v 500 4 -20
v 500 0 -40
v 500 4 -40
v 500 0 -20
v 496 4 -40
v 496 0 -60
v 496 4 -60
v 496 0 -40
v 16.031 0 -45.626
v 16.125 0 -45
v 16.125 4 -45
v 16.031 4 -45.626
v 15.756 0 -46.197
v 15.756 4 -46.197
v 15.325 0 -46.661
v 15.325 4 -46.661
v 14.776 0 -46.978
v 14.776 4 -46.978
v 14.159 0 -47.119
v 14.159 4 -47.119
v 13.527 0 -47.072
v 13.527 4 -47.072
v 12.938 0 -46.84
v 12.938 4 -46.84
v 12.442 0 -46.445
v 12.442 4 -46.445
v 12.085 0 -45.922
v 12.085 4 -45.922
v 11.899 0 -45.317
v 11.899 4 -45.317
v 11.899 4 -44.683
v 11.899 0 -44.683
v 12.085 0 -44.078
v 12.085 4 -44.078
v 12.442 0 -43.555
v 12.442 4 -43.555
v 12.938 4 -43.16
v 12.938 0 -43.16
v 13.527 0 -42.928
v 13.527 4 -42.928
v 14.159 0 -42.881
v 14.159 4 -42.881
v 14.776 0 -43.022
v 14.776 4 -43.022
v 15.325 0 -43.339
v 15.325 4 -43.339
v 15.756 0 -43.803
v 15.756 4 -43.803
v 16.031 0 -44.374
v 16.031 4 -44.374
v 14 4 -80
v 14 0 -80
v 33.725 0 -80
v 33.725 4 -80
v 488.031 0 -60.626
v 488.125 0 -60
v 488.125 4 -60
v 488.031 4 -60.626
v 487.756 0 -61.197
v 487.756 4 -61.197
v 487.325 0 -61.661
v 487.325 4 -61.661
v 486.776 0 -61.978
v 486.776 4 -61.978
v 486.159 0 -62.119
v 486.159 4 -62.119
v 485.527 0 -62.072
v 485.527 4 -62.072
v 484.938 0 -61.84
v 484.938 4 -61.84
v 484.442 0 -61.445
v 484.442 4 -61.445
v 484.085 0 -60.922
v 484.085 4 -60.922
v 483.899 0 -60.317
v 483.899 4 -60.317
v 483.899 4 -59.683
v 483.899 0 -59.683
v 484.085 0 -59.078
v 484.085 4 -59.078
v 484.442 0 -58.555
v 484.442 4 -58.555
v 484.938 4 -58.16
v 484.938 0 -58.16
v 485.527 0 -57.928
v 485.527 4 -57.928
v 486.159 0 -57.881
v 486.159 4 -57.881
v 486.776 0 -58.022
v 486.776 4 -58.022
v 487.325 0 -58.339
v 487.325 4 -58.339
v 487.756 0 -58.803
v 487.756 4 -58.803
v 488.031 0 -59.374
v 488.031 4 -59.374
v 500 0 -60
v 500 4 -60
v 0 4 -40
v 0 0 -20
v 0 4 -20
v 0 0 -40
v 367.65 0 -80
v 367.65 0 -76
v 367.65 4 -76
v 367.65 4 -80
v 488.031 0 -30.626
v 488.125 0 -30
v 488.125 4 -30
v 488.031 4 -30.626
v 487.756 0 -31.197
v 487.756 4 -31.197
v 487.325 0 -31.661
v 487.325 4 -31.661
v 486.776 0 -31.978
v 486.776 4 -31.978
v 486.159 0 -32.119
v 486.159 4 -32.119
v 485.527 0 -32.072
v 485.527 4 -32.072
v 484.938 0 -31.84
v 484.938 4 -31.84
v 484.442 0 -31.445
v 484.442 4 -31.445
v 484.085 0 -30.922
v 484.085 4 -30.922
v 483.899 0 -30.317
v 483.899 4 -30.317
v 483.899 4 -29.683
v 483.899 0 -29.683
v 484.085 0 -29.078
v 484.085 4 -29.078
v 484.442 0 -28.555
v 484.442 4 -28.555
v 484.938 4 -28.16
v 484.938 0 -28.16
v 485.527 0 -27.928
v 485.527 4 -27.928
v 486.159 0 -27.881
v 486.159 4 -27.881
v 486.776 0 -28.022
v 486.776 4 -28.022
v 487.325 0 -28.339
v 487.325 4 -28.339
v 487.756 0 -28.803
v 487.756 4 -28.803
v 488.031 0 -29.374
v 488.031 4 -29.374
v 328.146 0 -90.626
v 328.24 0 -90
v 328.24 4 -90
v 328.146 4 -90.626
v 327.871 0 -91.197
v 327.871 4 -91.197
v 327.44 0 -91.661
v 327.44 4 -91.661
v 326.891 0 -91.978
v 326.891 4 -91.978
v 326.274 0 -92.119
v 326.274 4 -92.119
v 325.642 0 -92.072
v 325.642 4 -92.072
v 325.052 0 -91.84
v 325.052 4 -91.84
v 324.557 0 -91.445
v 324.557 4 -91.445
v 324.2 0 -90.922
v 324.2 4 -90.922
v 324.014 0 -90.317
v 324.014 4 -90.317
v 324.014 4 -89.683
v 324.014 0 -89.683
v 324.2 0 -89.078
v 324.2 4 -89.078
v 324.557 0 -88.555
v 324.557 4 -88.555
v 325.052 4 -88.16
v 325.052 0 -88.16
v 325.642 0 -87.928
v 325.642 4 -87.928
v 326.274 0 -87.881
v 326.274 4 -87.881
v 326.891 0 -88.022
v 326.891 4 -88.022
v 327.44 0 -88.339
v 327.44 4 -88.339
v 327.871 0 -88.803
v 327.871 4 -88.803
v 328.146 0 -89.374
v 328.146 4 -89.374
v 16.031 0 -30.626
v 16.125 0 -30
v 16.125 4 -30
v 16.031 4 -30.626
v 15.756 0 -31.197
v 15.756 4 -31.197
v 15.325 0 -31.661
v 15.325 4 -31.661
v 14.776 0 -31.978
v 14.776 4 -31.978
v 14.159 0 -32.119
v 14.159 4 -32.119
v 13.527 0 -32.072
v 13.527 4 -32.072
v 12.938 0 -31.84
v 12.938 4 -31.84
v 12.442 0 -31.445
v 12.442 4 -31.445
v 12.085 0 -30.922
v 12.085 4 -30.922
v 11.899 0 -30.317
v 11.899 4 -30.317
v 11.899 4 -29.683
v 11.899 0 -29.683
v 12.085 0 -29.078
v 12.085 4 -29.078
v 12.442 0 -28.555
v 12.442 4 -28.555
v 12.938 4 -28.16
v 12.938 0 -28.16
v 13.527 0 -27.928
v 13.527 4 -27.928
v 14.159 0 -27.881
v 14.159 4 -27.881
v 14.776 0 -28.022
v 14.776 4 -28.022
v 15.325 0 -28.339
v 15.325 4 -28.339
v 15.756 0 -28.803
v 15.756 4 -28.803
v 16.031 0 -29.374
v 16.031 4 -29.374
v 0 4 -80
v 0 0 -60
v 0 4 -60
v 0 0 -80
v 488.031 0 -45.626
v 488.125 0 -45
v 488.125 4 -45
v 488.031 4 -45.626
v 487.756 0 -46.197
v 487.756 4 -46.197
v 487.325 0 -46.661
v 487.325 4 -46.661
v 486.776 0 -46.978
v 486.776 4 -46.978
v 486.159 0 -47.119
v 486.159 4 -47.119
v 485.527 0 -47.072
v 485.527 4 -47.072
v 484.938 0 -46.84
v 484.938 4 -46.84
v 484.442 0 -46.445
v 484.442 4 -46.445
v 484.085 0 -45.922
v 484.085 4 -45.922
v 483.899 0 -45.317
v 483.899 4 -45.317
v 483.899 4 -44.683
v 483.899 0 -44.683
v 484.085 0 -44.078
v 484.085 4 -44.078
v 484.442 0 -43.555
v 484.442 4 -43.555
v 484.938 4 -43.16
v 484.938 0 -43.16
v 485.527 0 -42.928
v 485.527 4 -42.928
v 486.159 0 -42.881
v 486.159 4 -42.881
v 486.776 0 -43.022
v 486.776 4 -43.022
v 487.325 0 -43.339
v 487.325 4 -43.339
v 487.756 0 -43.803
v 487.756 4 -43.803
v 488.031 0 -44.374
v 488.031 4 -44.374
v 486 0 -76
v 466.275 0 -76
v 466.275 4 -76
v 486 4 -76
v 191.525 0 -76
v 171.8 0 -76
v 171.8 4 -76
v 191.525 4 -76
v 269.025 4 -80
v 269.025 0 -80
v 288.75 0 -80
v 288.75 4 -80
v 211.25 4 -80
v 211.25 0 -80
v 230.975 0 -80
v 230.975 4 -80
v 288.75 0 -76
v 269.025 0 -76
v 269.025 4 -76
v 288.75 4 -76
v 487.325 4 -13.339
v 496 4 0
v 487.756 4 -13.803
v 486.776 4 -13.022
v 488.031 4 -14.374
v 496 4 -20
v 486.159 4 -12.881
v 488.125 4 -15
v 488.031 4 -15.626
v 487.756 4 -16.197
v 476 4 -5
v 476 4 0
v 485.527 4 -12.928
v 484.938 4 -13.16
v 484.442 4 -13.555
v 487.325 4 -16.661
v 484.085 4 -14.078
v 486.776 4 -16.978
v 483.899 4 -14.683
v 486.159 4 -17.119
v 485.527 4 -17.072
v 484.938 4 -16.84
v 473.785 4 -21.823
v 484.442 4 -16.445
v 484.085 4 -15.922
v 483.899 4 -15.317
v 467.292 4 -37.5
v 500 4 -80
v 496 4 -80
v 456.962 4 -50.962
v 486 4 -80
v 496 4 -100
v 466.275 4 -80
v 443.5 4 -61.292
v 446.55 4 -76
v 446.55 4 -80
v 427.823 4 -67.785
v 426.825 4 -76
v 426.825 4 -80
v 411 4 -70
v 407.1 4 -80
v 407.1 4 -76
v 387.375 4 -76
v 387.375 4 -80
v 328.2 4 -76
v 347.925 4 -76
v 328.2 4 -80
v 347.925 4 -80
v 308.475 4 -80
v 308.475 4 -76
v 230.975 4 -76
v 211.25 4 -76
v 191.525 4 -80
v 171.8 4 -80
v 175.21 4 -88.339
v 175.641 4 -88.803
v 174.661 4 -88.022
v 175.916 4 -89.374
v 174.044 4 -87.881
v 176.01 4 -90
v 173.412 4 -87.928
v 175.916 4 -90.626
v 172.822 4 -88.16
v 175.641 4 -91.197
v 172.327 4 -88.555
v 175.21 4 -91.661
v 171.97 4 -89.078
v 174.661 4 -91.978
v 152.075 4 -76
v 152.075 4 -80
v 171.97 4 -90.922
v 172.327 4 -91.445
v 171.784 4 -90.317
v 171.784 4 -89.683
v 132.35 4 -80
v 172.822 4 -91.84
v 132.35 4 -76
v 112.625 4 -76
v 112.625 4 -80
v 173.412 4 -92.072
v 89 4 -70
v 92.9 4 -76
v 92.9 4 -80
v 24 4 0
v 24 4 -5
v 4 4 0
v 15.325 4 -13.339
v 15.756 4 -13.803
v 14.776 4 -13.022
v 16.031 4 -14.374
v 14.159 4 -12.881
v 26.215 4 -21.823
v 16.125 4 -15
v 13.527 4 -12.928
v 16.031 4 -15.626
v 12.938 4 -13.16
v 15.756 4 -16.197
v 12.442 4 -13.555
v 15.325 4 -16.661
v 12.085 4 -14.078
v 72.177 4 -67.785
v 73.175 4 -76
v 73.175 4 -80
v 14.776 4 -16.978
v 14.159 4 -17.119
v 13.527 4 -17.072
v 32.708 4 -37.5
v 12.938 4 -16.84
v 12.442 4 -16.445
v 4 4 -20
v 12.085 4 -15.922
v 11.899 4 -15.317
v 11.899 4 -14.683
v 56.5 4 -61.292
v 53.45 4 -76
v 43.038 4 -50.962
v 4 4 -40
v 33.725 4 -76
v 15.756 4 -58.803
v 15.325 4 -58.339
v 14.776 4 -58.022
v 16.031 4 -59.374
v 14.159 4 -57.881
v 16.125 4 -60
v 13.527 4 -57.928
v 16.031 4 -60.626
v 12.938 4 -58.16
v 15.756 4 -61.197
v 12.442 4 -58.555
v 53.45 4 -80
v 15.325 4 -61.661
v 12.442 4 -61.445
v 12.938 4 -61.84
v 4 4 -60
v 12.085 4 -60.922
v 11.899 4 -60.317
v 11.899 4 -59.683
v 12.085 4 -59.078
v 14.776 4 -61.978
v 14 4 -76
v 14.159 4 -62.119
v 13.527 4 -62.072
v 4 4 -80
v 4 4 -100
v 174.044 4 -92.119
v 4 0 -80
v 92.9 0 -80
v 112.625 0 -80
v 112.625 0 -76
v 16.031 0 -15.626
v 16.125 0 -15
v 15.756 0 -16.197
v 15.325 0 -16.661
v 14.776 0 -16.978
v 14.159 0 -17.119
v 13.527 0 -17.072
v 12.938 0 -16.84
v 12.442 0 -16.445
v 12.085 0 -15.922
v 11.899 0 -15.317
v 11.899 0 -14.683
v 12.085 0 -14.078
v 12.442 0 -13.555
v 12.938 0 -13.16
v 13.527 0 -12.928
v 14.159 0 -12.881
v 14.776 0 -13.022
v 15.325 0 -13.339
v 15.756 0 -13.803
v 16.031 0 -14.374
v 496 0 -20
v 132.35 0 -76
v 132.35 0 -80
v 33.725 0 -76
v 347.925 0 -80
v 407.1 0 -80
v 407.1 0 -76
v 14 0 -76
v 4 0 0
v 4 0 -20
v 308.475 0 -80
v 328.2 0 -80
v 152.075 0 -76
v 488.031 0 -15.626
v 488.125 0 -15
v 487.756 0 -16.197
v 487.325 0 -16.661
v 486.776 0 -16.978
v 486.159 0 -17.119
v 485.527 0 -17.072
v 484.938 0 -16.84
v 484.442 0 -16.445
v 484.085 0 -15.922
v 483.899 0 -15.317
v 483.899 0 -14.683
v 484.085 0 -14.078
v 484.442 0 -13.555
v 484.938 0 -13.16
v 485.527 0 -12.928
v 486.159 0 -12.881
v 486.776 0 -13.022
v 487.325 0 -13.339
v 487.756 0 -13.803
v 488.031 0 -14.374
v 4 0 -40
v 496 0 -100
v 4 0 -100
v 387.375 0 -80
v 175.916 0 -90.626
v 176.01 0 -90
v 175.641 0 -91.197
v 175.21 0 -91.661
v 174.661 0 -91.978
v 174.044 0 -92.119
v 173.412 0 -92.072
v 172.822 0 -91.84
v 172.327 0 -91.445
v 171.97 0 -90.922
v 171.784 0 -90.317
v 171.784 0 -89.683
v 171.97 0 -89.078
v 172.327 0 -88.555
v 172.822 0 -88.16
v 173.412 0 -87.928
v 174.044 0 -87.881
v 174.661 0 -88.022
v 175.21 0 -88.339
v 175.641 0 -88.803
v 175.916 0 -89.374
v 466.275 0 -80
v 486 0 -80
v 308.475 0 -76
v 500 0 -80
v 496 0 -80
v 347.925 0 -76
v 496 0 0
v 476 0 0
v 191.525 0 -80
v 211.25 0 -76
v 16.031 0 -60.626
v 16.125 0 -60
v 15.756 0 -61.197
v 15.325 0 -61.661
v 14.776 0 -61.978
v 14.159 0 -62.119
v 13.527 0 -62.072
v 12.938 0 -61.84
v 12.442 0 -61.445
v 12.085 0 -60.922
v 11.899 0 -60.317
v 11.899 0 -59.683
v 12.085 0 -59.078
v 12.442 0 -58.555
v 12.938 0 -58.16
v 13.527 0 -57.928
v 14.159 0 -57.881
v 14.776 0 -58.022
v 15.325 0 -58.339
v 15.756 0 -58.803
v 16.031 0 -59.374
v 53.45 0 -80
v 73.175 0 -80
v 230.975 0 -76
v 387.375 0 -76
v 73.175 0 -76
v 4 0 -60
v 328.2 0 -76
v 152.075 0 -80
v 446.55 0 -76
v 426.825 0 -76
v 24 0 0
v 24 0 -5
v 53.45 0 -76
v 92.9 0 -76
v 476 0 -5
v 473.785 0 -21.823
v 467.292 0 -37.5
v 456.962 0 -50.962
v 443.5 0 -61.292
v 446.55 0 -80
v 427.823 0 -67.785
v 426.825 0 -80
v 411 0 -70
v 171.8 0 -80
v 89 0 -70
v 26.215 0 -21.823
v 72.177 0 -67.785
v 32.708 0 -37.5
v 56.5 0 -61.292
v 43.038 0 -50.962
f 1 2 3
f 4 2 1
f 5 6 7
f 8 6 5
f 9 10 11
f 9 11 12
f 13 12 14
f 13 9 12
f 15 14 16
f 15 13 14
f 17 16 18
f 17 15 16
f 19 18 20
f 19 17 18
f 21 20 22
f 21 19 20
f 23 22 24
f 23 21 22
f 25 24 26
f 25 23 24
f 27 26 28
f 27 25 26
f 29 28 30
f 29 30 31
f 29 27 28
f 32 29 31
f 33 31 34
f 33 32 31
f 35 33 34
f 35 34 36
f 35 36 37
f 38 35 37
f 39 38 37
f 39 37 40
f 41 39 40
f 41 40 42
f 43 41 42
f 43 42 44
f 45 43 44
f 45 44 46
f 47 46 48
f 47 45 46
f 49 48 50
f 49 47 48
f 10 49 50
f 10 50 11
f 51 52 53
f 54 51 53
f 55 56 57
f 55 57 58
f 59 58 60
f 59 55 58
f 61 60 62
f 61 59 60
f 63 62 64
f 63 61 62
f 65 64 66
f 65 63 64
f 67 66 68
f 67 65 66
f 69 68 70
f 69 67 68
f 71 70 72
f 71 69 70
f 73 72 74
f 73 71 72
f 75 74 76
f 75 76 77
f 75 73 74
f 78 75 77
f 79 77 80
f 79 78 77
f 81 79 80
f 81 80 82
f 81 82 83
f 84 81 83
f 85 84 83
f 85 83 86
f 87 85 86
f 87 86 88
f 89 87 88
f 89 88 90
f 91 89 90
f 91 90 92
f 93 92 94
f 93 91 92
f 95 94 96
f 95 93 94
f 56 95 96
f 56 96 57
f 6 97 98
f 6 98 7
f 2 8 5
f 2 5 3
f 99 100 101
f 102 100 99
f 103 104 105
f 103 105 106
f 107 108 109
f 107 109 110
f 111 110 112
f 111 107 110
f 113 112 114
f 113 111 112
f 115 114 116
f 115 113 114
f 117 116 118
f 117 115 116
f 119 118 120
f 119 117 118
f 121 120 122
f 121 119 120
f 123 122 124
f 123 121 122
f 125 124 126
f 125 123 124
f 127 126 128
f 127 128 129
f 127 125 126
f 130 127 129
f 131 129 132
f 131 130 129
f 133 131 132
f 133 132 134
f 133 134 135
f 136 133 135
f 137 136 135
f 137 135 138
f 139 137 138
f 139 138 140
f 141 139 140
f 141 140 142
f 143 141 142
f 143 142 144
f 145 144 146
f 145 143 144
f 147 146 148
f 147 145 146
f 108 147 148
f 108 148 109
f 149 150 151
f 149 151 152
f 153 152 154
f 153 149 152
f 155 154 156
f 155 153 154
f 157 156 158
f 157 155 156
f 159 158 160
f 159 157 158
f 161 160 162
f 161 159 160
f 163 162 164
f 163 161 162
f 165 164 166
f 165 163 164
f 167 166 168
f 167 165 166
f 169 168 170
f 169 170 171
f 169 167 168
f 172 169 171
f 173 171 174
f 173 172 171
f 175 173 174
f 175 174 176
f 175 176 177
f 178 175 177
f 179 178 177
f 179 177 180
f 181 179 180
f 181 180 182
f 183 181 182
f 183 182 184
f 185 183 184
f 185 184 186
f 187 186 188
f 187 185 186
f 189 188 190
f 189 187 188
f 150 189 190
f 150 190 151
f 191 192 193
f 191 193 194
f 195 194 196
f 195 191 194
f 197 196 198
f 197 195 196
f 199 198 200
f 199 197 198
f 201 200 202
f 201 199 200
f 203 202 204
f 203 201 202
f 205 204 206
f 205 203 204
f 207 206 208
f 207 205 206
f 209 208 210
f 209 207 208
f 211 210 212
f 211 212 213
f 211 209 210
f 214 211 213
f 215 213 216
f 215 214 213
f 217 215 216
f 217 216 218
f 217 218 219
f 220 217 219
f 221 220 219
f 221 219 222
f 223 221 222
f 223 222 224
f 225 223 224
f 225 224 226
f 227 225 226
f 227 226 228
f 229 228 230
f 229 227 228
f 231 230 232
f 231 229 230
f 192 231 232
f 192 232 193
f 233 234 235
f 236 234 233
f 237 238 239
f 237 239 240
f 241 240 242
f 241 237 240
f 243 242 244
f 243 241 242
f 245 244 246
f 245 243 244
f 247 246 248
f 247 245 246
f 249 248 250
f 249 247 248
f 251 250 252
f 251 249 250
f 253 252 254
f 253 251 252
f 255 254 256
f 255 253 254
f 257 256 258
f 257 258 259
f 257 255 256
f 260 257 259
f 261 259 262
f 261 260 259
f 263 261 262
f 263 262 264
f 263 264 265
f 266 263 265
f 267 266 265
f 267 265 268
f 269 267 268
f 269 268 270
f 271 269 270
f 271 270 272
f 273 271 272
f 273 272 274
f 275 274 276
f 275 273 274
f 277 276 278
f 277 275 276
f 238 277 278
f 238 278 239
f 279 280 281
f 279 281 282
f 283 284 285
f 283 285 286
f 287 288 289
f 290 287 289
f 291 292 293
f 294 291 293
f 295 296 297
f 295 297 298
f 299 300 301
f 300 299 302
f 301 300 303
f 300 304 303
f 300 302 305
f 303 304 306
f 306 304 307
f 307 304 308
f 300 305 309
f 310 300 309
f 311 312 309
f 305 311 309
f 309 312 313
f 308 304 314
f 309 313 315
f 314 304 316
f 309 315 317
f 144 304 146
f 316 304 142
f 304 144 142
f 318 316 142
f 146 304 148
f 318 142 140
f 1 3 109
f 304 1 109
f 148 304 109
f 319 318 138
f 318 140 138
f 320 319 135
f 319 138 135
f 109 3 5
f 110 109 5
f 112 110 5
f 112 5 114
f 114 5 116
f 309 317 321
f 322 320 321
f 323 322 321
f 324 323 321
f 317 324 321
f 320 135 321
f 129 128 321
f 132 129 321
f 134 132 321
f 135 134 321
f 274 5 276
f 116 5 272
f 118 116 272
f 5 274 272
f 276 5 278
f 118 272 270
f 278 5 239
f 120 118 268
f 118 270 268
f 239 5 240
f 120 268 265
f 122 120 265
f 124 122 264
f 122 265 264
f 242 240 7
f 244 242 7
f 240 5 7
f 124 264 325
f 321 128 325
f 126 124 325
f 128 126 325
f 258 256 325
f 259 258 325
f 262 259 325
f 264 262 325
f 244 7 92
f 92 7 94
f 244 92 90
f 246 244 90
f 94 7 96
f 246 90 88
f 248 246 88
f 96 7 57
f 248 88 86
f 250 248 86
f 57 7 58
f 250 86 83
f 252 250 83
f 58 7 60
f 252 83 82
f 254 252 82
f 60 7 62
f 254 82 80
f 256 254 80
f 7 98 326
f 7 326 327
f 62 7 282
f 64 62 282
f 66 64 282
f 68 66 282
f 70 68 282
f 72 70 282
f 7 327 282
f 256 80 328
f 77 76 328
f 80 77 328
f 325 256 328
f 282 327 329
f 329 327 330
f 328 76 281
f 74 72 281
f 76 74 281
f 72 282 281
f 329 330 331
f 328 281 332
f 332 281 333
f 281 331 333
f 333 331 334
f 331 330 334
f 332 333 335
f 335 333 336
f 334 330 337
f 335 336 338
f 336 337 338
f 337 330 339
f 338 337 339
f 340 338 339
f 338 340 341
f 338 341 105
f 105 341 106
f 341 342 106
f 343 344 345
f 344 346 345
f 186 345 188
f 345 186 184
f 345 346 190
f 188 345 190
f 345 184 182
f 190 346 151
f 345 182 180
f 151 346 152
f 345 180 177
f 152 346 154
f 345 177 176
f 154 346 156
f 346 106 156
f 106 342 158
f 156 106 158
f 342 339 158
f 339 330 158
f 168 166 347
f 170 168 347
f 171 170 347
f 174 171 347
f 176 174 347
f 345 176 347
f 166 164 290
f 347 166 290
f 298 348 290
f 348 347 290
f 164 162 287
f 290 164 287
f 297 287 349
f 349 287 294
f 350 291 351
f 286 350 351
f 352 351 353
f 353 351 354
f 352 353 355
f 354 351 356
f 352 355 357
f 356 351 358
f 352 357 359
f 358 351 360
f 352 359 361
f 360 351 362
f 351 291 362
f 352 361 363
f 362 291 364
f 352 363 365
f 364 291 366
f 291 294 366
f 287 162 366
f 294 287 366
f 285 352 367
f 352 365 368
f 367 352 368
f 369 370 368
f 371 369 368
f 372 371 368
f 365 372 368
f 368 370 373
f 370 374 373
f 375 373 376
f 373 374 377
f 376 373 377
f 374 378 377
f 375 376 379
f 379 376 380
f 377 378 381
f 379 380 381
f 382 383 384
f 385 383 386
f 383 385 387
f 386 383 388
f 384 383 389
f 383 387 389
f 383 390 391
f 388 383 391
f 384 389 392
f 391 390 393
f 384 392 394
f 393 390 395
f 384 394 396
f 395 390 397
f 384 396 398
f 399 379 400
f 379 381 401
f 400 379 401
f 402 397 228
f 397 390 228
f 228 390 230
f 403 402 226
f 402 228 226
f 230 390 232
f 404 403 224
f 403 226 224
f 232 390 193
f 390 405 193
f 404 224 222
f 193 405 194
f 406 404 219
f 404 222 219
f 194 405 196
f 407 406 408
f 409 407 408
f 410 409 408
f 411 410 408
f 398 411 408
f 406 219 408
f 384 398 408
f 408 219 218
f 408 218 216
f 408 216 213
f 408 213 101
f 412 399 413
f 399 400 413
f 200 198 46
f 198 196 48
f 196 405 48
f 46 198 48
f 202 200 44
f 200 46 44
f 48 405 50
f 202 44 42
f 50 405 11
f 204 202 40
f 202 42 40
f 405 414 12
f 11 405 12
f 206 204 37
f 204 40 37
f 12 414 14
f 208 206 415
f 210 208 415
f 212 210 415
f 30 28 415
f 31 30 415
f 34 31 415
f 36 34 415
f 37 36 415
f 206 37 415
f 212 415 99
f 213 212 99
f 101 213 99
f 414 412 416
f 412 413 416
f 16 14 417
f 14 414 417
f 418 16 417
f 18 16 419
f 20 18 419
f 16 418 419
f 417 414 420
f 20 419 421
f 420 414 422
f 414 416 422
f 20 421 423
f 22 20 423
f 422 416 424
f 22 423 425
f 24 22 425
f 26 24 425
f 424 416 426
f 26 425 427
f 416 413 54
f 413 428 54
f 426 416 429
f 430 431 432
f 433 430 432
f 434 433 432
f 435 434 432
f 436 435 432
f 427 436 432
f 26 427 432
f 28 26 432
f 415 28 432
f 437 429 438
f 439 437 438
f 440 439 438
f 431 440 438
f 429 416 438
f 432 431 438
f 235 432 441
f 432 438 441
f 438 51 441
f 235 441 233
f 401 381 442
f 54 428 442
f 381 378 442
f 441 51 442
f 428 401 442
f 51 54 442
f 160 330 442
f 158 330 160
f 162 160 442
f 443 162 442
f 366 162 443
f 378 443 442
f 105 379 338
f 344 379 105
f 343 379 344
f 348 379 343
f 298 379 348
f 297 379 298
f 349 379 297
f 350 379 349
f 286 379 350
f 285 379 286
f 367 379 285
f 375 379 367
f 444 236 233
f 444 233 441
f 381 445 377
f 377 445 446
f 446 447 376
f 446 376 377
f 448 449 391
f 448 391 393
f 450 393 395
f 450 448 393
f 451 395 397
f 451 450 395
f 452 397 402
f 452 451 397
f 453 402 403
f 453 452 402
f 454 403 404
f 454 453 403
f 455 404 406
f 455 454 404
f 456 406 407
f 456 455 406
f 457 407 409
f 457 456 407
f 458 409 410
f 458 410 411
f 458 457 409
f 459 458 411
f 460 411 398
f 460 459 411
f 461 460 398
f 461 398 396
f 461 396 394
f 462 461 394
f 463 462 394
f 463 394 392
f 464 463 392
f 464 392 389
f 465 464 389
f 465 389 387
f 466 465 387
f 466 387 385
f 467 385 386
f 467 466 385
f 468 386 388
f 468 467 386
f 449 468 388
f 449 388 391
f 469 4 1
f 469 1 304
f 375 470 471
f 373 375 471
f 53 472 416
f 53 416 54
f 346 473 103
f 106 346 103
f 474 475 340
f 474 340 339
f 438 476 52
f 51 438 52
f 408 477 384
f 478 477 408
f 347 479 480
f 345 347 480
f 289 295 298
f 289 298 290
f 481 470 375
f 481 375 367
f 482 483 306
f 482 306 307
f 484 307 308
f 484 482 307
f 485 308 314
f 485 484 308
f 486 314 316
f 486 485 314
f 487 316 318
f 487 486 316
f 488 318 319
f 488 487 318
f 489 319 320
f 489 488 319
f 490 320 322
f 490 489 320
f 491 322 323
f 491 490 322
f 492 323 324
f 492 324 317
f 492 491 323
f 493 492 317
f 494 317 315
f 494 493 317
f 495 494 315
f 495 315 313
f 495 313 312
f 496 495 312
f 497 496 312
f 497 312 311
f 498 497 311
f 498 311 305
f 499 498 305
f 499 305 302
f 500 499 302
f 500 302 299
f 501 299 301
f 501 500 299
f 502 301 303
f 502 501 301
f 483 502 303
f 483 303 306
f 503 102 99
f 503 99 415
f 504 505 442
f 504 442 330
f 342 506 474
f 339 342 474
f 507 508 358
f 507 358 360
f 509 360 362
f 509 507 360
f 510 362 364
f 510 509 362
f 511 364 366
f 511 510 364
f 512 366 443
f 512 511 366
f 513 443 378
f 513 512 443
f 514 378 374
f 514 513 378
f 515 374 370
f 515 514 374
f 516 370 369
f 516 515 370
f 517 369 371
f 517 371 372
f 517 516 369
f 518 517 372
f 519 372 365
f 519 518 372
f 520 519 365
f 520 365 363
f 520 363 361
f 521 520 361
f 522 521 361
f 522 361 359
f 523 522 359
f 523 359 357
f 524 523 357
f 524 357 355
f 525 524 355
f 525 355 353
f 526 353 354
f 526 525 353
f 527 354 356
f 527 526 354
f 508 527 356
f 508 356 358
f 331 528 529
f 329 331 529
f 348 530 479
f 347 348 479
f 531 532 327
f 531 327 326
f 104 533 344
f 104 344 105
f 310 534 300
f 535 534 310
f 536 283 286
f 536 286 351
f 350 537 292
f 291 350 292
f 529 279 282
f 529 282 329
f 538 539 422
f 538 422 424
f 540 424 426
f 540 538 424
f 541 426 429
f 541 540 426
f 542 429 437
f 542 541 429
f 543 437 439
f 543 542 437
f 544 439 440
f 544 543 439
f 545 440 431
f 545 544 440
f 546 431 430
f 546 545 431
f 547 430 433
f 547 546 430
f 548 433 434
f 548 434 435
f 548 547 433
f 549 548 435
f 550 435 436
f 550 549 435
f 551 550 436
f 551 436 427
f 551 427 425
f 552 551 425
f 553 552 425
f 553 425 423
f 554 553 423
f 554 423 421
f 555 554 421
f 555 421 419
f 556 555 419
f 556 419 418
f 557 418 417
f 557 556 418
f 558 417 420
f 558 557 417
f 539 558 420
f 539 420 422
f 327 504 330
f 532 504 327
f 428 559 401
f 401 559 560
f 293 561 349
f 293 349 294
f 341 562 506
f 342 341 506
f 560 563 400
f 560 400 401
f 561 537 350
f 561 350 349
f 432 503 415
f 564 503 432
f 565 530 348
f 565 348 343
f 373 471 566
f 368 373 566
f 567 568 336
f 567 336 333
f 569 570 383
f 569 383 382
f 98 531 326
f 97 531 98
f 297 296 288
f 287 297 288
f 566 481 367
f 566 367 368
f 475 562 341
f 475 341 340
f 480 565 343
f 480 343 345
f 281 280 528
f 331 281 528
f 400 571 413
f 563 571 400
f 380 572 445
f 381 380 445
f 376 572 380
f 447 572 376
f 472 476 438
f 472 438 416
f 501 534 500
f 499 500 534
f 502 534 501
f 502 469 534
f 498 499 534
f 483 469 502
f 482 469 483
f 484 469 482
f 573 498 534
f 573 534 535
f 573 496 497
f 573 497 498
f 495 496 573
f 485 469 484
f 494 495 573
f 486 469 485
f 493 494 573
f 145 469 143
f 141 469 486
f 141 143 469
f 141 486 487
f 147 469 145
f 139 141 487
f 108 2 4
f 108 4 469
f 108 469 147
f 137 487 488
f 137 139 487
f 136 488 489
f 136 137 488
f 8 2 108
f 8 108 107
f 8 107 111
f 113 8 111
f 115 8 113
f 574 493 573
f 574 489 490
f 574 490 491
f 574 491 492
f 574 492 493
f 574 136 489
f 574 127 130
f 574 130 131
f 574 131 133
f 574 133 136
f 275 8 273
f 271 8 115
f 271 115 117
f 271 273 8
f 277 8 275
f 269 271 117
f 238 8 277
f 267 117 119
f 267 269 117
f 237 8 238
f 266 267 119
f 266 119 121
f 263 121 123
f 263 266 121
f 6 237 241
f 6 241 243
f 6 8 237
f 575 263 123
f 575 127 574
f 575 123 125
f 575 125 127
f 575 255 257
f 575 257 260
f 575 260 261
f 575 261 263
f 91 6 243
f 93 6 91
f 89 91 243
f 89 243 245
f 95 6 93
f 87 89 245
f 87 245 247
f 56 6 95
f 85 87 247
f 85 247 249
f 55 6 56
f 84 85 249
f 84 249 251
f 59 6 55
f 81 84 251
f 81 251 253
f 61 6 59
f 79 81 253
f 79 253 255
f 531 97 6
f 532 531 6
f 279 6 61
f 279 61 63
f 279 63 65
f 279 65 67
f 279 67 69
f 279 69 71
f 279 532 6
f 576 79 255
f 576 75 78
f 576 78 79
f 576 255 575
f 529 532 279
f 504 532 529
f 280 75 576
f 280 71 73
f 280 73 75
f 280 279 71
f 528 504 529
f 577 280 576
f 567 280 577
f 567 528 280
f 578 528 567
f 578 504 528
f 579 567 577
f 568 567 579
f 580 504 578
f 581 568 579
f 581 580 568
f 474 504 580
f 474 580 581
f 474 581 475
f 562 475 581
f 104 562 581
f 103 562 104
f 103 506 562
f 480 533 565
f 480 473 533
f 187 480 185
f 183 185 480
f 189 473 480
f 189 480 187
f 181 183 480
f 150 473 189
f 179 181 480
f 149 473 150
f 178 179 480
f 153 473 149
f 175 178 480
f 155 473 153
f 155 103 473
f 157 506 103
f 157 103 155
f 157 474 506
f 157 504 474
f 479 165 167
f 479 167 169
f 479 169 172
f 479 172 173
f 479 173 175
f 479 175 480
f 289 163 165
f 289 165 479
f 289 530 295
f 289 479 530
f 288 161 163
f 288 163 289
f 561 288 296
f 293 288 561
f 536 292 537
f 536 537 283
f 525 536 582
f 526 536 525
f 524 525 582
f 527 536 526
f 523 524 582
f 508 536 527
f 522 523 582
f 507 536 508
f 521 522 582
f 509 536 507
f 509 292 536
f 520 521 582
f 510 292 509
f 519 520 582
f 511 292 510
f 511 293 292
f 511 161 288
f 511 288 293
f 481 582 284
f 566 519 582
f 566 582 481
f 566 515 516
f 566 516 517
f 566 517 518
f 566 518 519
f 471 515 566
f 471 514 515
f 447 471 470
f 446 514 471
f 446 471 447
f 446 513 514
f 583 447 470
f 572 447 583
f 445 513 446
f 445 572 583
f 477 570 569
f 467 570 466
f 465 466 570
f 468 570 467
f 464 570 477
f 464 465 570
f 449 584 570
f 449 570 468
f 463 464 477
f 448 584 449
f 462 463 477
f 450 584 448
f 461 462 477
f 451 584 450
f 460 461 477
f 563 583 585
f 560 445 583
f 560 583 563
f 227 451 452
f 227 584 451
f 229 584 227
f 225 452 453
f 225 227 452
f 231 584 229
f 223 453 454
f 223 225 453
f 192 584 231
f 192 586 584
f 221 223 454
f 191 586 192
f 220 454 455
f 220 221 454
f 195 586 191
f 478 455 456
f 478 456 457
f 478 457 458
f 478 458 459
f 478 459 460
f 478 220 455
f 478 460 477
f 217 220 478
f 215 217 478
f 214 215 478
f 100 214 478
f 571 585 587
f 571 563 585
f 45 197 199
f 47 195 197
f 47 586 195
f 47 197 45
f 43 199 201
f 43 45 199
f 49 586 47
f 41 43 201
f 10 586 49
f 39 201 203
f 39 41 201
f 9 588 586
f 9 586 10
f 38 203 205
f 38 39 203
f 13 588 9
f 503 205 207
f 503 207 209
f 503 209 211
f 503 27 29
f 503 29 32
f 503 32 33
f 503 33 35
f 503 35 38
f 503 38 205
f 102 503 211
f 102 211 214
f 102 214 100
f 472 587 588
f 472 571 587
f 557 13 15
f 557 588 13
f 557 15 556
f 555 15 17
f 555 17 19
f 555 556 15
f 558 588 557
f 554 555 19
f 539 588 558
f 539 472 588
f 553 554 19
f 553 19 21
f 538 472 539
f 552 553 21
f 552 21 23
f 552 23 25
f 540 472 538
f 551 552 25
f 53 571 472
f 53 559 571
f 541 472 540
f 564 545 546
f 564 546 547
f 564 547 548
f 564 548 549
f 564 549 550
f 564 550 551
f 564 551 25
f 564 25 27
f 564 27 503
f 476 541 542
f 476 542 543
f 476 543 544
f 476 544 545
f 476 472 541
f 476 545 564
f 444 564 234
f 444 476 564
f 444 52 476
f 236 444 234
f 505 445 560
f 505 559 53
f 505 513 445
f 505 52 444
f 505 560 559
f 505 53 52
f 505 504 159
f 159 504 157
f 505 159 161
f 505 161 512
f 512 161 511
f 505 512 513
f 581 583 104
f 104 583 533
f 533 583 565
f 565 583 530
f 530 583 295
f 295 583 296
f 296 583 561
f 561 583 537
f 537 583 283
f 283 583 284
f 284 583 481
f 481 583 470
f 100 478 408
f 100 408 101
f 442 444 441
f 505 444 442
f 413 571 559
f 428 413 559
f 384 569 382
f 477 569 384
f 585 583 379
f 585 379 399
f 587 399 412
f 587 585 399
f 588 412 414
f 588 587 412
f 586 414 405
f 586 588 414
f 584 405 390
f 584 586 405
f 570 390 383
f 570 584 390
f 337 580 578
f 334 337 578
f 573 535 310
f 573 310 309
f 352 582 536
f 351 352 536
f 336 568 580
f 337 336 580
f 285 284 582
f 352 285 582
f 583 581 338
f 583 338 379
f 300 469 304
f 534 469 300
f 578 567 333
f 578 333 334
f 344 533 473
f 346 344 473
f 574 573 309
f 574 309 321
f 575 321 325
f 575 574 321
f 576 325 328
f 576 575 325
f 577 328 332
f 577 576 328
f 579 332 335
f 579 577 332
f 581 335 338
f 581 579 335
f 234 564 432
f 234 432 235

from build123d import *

# Parameters (mm, degrees)
SKETCH1_R           = 2.125
SKETCH1_W           = 19.725
SKETCH1_H           = 4
BOSS_EXTRUDE1_DEPTH = 4


with BuildPart() as part:
    # Sketch1 → Boss-Extrude1 (new body)
    with BuildSketch(Plane(origin=(0, 0, 0), x_dir=(1, 0, 0), z_dir=(0, 1, 0))):
        with BuildLine():
            Line((4, 0), (4, 20))
            Line((4, 20), (0, 20))
            Line((0, 20), (0, 40))
            Line((0, 40), (4, 40))
            Line((4, 40), (4, 60))
            Line((4, 60), (0, 60))
            Line((0, 60), (0, 80))
            Line((0, 80), (4, 80))
            Line((4, 80), (4, 100))
            Line((4, 100), (250, 100))
            Line((250, 100), (496, 100))
            Line((496, 100), (496, 80))
            Line((496, 80), (500, 80))
            Line((500, 80), (500, 60))
            Line((500, 60), (496, 60))
            Line((496, 60), (496, 40))
            Line((496, 40), (500, 40))
            Line((500, 40), (500, 20))
            Line((500, 20), (496, 20))
            Line((496, 20), (496, 0))
            Line((496, 0), (476, 0))
            Line((476, 0), (476, 5))
            ThreePointArc((476, 5), (456.961940777, 50.961940777), (411, 70))
            Line((411, 70), (89, 70))
            ThreePointArc((89, 70), (43.038059223, 50.961940777), (24, 5))
            Line((24, 5), (24, 0))
            Line((24, 0), (4, 0))
        make_face()
        with Locations((14, 15)):
            Circle(SKETCH1_R, mode=Mode.SUBTRACT)
        with Locations((14, 30)):
            Circle(SKETCH1_R, mode=Mode.SUBTRACT)
        with Locations((173.885, 90)):
            Circle(SKETCH1_R, mode=Mode.SUBTRACT)
        with Locations((326.115, 90)):
            Circle(SKETCH1_R, mode=Mode.SUBTRACT)
        with Locations((486, 30)):
            Circle(SKETCH1_R, mode=Mode.SUBTRACT)
        with Locations((486, 15)):
            Circle(SKETCH1_R, mode=Mode.SUBTRACT)
        with Locations((14, 60)):
            Circle(SKETCH1_R, mode=Mode.SUBTRACT)
        with Locations((14, 45)):
            Circle(SKETCH1_R, mode=Mode.SUBTRACT)
        with Locations((486, 45)):
            Circle(SKETCH1_R, mode=Mode.SUBTRACT)
        with Locations((486, 60)):
            Circle(SKETCH1_R, mode=Mode.SUBTRACT)
        with Locations((63.3125, 78)):
            Rectangle(SKETCH1_W, SKETCH1_H, mode=Mode.SUBTRACT)
        with Locations((23.8625, 78)):
            Rectangle(SKETCH1_W, SKETCH1_H, mode=Mode.SUBTRACT)
        with Locations((102.7625, 78)):
            Rectangle(SKETCH1_W, SKETCH1_H, mode=Mode.SUBTRACT)
        with Locations((142.2125, 78)):
            Rectangle(SKETCH1_W, SKETCH1_H, mode=Mode.SUBTRACT)
        with Locations((181.6625, 78)):
            Rectangle(SKETCH1_W, SKETCH1_H, mode=Mode.SUBTRACT)
        with Locations((221.1125, 78)):
            Rectangle(SKETCH1_W, SKETCH1_H, mode=Mode.SUBTRACT)
        with Locations((278.8875, 78)):
            Rectangle(SKETCH1_W, SKETCH1_H, mode=Mode.SUBTRACT)
        with Locations((318.3375, 78)):
            Rectangle(SKETCH1_W, SKETCH1_H, mode=Mode.SUBTRACT)
        with Locations((357.7875, 78)):
            Rectangle(SKETCH1_W, SKETCH1_H, mode=Mode.SUBTRACT)
        with Locations((397.2375, 78)):
            Rectangle(SKETCH1_W, SKETCH1_H, mode=Mode.SUBTRACT)
        with Locations((436.6875, 78)):
            Rectangle(SKETCH1_W, SKETCH1_H, mode=Mode.SUBTRACT)
        with Locations((476.1375, 78)):
            Rectangle(SKETCH1_W, SKETCH1_H, mode=Mode.SUBTRACT)
    extrude(amount=BOSS_EXTRUDE1_DEPTH)


solid = part.part
